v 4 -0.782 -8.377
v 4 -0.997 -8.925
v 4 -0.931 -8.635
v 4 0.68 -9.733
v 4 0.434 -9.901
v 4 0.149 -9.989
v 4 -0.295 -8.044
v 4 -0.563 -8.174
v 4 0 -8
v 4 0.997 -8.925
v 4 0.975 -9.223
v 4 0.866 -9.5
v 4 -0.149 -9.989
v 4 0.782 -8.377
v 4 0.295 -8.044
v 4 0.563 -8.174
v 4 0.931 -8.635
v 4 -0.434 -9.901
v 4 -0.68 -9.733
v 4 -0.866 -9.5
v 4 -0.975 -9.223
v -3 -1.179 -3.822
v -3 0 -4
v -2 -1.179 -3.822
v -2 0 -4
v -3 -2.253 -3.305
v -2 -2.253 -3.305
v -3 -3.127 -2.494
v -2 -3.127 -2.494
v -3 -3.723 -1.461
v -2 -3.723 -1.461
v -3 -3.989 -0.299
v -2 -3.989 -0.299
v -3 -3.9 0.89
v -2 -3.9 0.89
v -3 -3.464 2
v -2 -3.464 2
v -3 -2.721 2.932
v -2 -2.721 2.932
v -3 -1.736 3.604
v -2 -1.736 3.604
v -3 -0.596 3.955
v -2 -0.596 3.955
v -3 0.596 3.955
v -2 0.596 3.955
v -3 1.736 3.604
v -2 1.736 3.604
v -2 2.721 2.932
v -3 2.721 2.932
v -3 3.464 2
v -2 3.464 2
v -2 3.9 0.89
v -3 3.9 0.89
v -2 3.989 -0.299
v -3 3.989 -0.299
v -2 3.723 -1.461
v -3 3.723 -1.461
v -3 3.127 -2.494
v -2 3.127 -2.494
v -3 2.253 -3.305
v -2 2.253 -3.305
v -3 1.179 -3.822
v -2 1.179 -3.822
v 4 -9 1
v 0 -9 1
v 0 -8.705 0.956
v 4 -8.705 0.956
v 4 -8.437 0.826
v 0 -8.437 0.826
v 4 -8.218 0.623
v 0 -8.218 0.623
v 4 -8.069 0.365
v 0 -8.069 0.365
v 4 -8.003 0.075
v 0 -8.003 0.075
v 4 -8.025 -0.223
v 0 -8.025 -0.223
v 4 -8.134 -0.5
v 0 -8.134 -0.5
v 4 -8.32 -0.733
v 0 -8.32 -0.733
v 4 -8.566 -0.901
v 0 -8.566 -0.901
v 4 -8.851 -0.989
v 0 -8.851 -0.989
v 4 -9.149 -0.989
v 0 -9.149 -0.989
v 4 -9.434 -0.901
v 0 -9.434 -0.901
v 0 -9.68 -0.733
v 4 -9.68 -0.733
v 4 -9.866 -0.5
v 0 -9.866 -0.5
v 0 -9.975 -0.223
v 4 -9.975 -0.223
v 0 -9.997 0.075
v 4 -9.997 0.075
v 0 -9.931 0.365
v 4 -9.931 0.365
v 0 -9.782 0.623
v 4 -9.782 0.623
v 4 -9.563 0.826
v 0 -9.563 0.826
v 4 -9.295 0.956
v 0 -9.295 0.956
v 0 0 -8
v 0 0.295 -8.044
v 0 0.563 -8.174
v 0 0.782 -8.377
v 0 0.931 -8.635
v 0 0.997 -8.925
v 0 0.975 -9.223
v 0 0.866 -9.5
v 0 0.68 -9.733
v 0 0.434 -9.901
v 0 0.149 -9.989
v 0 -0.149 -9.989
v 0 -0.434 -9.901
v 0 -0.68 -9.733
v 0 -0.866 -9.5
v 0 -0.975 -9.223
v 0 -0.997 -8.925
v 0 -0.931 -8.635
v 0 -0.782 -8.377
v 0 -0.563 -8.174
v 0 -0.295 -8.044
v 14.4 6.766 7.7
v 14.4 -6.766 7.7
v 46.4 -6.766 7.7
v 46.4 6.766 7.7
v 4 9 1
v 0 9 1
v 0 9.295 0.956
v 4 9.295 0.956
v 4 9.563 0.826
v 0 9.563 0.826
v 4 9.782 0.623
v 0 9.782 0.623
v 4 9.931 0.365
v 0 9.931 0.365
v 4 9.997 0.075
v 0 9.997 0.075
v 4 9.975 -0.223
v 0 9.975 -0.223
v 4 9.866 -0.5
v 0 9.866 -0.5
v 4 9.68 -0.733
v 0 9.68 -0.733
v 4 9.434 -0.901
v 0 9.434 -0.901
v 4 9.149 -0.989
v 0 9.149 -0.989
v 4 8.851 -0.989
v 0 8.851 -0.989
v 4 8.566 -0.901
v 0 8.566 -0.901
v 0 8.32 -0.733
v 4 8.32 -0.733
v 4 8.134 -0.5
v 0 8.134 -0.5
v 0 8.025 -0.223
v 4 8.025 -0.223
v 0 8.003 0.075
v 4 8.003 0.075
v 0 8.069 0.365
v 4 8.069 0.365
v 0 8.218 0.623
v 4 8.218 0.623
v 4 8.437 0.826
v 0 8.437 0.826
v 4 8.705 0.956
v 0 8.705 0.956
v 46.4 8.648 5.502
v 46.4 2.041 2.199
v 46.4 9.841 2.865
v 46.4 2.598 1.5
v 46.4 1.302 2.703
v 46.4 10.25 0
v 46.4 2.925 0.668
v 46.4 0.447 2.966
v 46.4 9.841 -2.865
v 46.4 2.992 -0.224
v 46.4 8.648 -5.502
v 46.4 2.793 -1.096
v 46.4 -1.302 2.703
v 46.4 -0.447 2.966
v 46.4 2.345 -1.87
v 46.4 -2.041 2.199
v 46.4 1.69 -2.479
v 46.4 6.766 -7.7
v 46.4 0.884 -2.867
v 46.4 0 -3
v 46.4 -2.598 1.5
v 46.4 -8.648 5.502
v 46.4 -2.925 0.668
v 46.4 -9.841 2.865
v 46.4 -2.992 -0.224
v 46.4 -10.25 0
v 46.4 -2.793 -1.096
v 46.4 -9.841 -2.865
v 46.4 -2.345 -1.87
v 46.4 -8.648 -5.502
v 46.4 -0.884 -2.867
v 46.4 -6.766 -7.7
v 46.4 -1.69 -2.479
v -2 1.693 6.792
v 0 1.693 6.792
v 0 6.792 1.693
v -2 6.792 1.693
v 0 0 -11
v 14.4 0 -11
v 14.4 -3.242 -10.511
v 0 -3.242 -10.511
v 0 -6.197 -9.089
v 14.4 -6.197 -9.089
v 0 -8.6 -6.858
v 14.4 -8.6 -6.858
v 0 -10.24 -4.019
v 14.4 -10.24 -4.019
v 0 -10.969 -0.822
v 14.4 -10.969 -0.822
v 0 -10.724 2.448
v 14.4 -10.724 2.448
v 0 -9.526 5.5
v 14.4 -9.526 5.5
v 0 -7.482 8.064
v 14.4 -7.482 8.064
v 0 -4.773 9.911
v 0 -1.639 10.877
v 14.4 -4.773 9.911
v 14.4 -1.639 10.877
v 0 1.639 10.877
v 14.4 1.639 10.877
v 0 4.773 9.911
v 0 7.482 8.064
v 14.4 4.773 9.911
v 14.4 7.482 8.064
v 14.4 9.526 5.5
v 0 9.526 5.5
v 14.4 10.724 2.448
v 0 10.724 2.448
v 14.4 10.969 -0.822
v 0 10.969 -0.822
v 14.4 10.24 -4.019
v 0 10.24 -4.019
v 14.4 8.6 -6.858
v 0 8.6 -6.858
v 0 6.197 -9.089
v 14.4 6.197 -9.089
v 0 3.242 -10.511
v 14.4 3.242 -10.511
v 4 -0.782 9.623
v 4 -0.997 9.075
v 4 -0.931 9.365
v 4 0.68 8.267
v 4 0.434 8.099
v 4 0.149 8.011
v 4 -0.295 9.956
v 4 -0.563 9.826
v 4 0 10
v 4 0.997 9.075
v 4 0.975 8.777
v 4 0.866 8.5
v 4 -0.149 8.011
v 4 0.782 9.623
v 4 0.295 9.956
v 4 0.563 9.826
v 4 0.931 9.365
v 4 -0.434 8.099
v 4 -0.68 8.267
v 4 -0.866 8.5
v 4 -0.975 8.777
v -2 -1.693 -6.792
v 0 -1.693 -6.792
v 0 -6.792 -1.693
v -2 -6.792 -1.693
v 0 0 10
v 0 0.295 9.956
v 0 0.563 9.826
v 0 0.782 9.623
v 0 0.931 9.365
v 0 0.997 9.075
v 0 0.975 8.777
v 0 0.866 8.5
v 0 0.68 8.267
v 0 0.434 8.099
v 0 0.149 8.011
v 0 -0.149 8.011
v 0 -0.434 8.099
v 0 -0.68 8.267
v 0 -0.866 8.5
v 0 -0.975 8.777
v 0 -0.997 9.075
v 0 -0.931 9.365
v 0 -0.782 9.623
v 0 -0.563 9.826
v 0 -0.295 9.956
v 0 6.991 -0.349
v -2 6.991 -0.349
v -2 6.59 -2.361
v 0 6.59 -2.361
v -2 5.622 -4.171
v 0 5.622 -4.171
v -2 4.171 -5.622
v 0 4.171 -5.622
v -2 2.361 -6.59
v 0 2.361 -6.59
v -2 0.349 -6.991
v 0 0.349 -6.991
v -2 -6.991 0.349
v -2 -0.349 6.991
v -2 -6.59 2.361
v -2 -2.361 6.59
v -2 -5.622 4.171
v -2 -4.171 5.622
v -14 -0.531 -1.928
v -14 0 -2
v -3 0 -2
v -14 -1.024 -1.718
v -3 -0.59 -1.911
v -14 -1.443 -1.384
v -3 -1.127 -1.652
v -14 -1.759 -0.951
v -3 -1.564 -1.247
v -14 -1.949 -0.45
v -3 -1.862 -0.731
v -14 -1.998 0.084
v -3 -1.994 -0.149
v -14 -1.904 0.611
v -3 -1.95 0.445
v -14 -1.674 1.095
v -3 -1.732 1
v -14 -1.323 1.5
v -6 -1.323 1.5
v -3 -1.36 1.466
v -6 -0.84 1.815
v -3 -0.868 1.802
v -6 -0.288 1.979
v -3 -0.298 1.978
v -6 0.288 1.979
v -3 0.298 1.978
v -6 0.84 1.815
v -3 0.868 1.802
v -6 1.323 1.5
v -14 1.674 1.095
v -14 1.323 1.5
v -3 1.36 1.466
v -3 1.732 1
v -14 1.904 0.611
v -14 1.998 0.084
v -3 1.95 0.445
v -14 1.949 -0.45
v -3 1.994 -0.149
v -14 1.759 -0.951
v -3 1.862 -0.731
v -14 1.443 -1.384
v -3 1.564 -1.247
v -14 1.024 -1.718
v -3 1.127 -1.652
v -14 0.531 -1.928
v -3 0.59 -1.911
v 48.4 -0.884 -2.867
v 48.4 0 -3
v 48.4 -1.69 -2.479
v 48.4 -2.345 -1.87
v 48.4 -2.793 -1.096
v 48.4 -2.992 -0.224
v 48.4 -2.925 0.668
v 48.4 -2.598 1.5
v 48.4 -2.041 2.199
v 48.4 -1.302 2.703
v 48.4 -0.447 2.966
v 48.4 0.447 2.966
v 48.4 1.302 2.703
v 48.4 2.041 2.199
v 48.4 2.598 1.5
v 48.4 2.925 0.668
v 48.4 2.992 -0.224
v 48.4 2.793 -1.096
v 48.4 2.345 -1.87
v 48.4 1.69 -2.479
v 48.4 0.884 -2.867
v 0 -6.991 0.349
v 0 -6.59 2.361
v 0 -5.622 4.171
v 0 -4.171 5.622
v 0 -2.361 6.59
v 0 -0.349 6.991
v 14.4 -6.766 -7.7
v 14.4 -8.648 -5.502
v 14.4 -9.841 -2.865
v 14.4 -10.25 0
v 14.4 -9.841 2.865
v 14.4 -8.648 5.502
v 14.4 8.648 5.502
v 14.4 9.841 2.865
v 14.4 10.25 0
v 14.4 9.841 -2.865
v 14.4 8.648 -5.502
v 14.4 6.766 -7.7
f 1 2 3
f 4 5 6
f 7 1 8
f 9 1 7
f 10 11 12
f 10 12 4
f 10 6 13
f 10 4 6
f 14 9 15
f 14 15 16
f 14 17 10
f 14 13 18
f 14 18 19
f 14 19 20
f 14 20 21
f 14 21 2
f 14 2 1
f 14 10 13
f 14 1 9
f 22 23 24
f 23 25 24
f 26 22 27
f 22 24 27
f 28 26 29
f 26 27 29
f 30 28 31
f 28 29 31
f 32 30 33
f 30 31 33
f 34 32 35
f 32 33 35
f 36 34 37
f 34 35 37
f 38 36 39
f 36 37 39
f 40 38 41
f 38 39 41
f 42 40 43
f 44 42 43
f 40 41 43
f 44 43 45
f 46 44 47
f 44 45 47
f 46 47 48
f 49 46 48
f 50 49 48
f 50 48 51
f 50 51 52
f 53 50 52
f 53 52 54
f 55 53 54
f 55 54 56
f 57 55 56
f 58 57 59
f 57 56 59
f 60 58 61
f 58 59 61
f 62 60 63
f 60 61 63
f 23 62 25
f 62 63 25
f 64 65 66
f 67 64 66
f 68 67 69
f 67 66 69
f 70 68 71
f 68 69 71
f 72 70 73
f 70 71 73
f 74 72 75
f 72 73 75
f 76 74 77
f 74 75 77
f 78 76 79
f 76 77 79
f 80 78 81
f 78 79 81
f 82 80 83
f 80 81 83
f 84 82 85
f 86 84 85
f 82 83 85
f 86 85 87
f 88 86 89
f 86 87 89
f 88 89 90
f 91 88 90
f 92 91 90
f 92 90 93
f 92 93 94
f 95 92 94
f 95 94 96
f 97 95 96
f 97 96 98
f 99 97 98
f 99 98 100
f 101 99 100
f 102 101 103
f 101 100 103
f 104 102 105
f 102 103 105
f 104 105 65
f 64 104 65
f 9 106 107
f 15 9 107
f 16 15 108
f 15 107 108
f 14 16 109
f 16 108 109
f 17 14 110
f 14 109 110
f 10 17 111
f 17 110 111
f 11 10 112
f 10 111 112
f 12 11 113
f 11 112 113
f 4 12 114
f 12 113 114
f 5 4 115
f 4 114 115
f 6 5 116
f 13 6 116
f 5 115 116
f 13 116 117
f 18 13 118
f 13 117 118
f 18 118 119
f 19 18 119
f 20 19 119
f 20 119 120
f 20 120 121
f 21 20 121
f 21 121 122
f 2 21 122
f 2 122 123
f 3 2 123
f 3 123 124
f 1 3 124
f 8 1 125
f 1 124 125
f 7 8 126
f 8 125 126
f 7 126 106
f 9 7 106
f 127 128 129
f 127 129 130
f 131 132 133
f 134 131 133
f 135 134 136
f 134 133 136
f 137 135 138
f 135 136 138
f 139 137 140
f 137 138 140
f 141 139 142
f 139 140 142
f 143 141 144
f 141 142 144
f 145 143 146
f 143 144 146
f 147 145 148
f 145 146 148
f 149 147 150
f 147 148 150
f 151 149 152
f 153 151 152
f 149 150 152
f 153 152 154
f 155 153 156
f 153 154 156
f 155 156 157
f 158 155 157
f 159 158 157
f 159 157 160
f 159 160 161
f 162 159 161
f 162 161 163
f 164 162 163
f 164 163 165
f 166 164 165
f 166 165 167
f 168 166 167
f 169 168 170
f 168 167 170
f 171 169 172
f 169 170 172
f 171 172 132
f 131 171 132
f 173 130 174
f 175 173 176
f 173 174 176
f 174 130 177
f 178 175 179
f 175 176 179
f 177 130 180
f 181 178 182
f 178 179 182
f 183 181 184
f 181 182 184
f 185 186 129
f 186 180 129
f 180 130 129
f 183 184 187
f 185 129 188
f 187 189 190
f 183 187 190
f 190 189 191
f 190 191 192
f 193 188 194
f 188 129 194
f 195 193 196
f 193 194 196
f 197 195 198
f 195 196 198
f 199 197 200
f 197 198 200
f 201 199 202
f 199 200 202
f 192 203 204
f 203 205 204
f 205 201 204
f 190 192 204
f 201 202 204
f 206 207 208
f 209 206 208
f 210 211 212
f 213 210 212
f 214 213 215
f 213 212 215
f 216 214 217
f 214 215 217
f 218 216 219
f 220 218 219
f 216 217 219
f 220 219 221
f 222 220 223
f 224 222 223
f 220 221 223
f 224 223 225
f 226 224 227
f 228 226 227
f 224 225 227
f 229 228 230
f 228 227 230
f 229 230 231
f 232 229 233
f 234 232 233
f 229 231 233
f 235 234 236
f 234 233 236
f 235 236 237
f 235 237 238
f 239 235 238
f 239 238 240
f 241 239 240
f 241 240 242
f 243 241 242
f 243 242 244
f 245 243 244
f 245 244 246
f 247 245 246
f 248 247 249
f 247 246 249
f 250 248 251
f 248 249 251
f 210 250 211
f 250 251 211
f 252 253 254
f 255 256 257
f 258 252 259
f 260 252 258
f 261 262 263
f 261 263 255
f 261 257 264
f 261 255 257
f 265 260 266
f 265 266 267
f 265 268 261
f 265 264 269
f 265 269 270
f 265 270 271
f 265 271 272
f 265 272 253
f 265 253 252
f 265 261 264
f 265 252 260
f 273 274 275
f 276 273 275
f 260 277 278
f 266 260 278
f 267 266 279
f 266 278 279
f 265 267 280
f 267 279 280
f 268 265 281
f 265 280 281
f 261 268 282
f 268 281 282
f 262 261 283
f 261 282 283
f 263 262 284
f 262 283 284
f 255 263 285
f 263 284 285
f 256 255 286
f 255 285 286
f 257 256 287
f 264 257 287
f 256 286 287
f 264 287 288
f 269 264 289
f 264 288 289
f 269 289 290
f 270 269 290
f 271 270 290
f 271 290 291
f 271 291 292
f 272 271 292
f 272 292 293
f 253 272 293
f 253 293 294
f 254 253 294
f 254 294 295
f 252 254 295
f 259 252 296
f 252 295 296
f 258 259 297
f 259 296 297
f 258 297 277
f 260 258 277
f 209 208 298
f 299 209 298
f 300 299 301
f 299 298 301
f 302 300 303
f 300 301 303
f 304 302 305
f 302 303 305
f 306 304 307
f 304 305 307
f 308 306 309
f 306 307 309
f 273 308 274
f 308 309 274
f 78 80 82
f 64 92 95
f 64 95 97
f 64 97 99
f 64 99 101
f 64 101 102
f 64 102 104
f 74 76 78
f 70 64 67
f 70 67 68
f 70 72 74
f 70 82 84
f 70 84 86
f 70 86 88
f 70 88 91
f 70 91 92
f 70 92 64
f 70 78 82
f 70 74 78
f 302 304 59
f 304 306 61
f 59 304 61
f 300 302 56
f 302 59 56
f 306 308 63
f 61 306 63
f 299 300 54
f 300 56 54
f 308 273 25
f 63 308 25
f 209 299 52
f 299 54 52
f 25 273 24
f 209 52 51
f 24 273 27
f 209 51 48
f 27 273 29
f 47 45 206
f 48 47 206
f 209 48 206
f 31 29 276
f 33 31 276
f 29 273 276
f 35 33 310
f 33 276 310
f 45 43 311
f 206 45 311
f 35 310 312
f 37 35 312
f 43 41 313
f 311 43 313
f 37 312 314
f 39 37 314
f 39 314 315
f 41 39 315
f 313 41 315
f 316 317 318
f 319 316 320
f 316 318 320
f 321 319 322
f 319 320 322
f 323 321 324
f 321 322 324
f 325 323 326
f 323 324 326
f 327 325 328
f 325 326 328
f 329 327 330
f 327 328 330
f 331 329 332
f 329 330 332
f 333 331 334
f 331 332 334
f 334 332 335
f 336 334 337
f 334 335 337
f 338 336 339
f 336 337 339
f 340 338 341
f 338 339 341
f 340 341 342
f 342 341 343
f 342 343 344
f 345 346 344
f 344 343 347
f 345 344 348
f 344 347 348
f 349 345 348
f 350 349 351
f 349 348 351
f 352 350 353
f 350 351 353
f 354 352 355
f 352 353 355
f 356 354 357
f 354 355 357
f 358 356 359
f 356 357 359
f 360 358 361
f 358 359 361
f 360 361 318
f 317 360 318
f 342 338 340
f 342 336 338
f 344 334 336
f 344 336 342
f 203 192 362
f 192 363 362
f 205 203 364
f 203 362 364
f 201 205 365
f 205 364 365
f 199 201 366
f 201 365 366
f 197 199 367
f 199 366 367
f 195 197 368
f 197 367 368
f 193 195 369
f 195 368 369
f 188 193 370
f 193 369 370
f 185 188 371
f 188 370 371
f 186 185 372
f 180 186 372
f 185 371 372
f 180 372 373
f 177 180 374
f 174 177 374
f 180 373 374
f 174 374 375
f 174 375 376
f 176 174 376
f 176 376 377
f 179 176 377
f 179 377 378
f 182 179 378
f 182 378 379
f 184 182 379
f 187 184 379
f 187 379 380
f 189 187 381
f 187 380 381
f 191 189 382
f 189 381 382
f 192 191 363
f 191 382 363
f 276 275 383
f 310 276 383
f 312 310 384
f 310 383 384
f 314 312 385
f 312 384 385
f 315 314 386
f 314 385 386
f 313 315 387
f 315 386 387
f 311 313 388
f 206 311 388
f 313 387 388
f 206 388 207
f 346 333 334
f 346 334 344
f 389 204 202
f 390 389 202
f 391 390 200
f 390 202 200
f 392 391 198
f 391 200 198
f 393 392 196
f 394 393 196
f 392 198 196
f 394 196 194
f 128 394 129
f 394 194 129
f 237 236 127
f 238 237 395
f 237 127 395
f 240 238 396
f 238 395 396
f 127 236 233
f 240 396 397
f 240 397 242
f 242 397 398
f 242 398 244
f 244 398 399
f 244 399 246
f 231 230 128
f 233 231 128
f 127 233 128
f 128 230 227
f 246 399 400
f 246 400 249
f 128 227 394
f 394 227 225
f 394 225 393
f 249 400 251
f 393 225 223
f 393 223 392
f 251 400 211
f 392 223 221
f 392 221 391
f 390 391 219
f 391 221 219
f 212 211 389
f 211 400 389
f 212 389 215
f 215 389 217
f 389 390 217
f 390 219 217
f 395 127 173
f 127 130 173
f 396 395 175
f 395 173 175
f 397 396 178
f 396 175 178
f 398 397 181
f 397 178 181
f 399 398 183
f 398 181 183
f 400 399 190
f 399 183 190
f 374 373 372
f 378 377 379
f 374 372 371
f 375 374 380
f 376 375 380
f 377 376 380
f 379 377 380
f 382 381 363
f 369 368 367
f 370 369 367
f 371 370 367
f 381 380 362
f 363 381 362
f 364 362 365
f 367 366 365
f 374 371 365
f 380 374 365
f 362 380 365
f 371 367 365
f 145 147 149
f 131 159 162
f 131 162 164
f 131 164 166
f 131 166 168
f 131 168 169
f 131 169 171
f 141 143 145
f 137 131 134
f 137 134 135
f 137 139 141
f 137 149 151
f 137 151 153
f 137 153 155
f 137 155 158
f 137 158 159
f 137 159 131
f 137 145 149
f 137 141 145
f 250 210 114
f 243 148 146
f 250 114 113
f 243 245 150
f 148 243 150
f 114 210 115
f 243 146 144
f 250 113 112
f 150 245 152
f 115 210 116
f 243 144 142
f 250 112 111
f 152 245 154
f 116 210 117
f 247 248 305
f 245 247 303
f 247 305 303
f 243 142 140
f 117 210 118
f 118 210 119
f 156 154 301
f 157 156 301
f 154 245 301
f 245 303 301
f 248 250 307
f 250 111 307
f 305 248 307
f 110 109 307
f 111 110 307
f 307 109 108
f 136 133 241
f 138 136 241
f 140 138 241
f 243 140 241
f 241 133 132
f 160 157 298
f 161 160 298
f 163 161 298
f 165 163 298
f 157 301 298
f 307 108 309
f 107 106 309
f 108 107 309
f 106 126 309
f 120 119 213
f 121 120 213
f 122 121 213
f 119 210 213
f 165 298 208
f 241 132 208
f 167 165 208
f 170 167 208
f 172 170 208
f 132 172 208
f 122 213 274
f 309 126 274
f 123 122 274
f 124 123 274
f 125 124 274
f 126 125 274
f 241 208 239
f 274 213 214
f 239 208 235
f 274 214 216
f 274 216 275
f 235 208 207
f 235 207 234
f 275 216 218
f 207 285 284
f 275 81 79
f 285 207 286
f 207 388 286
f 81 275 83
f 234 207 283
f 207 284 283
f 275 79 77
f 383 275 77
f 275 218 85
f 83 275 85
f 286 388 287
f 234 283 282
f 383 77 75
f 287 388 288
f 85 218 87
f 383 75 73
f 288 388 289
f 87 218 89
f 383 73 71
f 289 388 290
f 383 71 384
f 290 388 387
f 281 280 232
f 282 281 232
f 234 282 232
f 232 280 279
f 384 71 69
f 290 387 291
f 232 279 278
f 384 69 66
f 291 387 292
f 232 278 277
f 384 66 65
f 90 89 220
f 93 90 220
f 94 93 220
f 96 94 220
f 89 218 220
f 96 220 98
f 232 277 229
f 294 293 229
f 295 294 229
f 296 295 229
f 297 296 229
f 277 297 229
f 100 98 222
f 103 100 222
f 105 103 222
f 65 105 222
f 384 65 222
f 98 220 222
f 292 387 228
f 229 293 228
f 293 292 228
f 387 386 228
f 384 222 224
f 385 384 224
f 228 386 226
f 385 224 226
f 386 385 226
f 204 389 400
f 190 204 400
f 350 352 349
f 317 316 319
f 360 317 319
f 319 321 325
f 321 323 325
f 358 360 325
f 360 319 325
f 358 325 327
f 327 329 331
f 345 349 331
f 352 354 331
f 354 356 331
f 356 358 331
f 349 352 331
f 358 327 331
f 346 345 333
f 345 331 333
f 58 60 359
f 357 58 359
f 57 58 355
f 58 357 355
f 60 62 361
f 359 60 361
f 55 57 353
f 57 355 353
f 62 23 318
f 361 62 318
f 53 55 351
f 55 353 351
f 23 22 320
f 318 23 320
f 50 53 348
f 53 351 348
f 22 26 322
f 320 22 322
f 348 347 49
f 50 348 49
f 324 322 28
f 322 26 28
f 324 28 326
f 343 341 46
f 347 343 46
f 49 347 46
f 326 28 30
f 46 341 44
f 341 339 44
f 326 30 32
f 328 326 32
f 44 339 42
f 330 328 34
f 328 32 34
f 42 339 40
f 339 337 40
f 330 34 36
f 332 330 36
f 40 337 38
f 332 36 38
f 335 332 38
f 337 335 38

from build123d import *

# Parameters (mm, degrees)
ESQUISSE2_W             = 8.320302529
ESQUISSE2_H             = 23.371875391
ESQUISSE2_W_2           = 7.922092332
ENL_V_MAT_EXTRU_1_DEPTH = 32
ENL_V_START             = -2
ENL_V_MAT_EXTRU_2_DEPTH = 2
ESQUISSE4_R             = 1
ENL_V_MAT_EXTRU_3_DEPTH = 4
ESQUISSE5_W             = 12.730996015
ESQUISSE5_H             = 15.162705394
ENL_V_MAT_EXTRU_4_DEPTH = 8


with BuildPart() as part:
    # Esquisse1 → Révolution1 (revolve)
    with BuildSketch(Plane.XY, mode=Mode.PRIVATE) as r_volution1_sk:
        Polygon((-14, 0), (-14, -2), (-3, -2), (-3, -4), (-2, -4), (-2, -7), (0, -7), (0, -11), (14.4, -11), (14.4, -10.25), (46.4, -10.25), (46.4, -3), (48.4, -3), (48.4, 0), align=None)
    revolve(r_volution1_sk.sketch.rotate(Axis((38.703399471, 0, 0), (-1, 0, 0)), 270), axis=Axis((38.703399471, 0, 0), (-1, 0, 0)))

    # Esquisse2 → Enlèv. mat.-Extru.1 (cut)
    with BuildSketch(Plane(origin=(46.4, 0, 0), x_dir=(0, 0, -1), z_dir=(1, 0, 0))):
        with Locations((-11.860151265, -0.490104857)):
            Rectangle(ESQUISSE2_W, ESQUISSE2_H)
        with Locations((11.661046166, -0.490104857)):
            Rectangle(ESQUISSE2_W_2, ESQUISSE2_H)
    extrude(amount=-ENL_V_MAT_EXTRU_1_DEPTH, mode=Mode.SUBTRACT)

    # Esquisse3 → Enlèv. mat.-Extru.2 (cut)
    with BuildSketch(Plane.ZY.offset(2).offset(ENL_V_START)):
        with BuildLine():
            Line((6.792150444, 1.69313093), (1.69313093, 6.792150444))
            ThreePointArc((1.69313093, 6.792150444), (4.949747468, 4.949747468), (6.792150444, 1.69313093))
        make_face()
        with BuildLine():
            Line((-6.792150444, -1.69313093), (-1.69313093, -6.792150444))
            ThreePointArc((-1.69313093, -6.792150444), (-4.949747468, -4.949747468), (-6.792150444, -1.69313093))
        make_face()
    extrude(amount=ENL_V_MAT_EXTRU_2_DEPTH, mode=Mode.SUBTRACT)

    # Esquisse4 → Enlèv. mat.-Extru.3 (cut)
    with BuildSketch(Plane.ZY):
        with Locations((0, 9)):
            Circle(ESQUISSE4_R)
        with Locations((-9, 0)):
            Circle(ESQUISSE4_R)
        with Locations((0, -9)):
            Circle(ESQUISSE4_R)
        with Locations((9, 0)):
            Circle(ESQUISSE4_R)
    extrude(amount=-ENL_V_MAT_EXTRU_3_DEPTH, mode=Mode.SUBTRACT)

    # Esquisse5 → Enlèv. mat.-Extru.4 (cut)
    with BuildSketch(Plane.ZY.offset(14)):
        with Locations((7.865498008, 1.780904513)):
            Rectangle(ESQUISSE5_W, ESQUISSE5_H)
    extrude(amount=-ENL_V_MAT_EXTRU_4_DEPTH, mode=Mode.SUBTRACT)


solid = part.part
